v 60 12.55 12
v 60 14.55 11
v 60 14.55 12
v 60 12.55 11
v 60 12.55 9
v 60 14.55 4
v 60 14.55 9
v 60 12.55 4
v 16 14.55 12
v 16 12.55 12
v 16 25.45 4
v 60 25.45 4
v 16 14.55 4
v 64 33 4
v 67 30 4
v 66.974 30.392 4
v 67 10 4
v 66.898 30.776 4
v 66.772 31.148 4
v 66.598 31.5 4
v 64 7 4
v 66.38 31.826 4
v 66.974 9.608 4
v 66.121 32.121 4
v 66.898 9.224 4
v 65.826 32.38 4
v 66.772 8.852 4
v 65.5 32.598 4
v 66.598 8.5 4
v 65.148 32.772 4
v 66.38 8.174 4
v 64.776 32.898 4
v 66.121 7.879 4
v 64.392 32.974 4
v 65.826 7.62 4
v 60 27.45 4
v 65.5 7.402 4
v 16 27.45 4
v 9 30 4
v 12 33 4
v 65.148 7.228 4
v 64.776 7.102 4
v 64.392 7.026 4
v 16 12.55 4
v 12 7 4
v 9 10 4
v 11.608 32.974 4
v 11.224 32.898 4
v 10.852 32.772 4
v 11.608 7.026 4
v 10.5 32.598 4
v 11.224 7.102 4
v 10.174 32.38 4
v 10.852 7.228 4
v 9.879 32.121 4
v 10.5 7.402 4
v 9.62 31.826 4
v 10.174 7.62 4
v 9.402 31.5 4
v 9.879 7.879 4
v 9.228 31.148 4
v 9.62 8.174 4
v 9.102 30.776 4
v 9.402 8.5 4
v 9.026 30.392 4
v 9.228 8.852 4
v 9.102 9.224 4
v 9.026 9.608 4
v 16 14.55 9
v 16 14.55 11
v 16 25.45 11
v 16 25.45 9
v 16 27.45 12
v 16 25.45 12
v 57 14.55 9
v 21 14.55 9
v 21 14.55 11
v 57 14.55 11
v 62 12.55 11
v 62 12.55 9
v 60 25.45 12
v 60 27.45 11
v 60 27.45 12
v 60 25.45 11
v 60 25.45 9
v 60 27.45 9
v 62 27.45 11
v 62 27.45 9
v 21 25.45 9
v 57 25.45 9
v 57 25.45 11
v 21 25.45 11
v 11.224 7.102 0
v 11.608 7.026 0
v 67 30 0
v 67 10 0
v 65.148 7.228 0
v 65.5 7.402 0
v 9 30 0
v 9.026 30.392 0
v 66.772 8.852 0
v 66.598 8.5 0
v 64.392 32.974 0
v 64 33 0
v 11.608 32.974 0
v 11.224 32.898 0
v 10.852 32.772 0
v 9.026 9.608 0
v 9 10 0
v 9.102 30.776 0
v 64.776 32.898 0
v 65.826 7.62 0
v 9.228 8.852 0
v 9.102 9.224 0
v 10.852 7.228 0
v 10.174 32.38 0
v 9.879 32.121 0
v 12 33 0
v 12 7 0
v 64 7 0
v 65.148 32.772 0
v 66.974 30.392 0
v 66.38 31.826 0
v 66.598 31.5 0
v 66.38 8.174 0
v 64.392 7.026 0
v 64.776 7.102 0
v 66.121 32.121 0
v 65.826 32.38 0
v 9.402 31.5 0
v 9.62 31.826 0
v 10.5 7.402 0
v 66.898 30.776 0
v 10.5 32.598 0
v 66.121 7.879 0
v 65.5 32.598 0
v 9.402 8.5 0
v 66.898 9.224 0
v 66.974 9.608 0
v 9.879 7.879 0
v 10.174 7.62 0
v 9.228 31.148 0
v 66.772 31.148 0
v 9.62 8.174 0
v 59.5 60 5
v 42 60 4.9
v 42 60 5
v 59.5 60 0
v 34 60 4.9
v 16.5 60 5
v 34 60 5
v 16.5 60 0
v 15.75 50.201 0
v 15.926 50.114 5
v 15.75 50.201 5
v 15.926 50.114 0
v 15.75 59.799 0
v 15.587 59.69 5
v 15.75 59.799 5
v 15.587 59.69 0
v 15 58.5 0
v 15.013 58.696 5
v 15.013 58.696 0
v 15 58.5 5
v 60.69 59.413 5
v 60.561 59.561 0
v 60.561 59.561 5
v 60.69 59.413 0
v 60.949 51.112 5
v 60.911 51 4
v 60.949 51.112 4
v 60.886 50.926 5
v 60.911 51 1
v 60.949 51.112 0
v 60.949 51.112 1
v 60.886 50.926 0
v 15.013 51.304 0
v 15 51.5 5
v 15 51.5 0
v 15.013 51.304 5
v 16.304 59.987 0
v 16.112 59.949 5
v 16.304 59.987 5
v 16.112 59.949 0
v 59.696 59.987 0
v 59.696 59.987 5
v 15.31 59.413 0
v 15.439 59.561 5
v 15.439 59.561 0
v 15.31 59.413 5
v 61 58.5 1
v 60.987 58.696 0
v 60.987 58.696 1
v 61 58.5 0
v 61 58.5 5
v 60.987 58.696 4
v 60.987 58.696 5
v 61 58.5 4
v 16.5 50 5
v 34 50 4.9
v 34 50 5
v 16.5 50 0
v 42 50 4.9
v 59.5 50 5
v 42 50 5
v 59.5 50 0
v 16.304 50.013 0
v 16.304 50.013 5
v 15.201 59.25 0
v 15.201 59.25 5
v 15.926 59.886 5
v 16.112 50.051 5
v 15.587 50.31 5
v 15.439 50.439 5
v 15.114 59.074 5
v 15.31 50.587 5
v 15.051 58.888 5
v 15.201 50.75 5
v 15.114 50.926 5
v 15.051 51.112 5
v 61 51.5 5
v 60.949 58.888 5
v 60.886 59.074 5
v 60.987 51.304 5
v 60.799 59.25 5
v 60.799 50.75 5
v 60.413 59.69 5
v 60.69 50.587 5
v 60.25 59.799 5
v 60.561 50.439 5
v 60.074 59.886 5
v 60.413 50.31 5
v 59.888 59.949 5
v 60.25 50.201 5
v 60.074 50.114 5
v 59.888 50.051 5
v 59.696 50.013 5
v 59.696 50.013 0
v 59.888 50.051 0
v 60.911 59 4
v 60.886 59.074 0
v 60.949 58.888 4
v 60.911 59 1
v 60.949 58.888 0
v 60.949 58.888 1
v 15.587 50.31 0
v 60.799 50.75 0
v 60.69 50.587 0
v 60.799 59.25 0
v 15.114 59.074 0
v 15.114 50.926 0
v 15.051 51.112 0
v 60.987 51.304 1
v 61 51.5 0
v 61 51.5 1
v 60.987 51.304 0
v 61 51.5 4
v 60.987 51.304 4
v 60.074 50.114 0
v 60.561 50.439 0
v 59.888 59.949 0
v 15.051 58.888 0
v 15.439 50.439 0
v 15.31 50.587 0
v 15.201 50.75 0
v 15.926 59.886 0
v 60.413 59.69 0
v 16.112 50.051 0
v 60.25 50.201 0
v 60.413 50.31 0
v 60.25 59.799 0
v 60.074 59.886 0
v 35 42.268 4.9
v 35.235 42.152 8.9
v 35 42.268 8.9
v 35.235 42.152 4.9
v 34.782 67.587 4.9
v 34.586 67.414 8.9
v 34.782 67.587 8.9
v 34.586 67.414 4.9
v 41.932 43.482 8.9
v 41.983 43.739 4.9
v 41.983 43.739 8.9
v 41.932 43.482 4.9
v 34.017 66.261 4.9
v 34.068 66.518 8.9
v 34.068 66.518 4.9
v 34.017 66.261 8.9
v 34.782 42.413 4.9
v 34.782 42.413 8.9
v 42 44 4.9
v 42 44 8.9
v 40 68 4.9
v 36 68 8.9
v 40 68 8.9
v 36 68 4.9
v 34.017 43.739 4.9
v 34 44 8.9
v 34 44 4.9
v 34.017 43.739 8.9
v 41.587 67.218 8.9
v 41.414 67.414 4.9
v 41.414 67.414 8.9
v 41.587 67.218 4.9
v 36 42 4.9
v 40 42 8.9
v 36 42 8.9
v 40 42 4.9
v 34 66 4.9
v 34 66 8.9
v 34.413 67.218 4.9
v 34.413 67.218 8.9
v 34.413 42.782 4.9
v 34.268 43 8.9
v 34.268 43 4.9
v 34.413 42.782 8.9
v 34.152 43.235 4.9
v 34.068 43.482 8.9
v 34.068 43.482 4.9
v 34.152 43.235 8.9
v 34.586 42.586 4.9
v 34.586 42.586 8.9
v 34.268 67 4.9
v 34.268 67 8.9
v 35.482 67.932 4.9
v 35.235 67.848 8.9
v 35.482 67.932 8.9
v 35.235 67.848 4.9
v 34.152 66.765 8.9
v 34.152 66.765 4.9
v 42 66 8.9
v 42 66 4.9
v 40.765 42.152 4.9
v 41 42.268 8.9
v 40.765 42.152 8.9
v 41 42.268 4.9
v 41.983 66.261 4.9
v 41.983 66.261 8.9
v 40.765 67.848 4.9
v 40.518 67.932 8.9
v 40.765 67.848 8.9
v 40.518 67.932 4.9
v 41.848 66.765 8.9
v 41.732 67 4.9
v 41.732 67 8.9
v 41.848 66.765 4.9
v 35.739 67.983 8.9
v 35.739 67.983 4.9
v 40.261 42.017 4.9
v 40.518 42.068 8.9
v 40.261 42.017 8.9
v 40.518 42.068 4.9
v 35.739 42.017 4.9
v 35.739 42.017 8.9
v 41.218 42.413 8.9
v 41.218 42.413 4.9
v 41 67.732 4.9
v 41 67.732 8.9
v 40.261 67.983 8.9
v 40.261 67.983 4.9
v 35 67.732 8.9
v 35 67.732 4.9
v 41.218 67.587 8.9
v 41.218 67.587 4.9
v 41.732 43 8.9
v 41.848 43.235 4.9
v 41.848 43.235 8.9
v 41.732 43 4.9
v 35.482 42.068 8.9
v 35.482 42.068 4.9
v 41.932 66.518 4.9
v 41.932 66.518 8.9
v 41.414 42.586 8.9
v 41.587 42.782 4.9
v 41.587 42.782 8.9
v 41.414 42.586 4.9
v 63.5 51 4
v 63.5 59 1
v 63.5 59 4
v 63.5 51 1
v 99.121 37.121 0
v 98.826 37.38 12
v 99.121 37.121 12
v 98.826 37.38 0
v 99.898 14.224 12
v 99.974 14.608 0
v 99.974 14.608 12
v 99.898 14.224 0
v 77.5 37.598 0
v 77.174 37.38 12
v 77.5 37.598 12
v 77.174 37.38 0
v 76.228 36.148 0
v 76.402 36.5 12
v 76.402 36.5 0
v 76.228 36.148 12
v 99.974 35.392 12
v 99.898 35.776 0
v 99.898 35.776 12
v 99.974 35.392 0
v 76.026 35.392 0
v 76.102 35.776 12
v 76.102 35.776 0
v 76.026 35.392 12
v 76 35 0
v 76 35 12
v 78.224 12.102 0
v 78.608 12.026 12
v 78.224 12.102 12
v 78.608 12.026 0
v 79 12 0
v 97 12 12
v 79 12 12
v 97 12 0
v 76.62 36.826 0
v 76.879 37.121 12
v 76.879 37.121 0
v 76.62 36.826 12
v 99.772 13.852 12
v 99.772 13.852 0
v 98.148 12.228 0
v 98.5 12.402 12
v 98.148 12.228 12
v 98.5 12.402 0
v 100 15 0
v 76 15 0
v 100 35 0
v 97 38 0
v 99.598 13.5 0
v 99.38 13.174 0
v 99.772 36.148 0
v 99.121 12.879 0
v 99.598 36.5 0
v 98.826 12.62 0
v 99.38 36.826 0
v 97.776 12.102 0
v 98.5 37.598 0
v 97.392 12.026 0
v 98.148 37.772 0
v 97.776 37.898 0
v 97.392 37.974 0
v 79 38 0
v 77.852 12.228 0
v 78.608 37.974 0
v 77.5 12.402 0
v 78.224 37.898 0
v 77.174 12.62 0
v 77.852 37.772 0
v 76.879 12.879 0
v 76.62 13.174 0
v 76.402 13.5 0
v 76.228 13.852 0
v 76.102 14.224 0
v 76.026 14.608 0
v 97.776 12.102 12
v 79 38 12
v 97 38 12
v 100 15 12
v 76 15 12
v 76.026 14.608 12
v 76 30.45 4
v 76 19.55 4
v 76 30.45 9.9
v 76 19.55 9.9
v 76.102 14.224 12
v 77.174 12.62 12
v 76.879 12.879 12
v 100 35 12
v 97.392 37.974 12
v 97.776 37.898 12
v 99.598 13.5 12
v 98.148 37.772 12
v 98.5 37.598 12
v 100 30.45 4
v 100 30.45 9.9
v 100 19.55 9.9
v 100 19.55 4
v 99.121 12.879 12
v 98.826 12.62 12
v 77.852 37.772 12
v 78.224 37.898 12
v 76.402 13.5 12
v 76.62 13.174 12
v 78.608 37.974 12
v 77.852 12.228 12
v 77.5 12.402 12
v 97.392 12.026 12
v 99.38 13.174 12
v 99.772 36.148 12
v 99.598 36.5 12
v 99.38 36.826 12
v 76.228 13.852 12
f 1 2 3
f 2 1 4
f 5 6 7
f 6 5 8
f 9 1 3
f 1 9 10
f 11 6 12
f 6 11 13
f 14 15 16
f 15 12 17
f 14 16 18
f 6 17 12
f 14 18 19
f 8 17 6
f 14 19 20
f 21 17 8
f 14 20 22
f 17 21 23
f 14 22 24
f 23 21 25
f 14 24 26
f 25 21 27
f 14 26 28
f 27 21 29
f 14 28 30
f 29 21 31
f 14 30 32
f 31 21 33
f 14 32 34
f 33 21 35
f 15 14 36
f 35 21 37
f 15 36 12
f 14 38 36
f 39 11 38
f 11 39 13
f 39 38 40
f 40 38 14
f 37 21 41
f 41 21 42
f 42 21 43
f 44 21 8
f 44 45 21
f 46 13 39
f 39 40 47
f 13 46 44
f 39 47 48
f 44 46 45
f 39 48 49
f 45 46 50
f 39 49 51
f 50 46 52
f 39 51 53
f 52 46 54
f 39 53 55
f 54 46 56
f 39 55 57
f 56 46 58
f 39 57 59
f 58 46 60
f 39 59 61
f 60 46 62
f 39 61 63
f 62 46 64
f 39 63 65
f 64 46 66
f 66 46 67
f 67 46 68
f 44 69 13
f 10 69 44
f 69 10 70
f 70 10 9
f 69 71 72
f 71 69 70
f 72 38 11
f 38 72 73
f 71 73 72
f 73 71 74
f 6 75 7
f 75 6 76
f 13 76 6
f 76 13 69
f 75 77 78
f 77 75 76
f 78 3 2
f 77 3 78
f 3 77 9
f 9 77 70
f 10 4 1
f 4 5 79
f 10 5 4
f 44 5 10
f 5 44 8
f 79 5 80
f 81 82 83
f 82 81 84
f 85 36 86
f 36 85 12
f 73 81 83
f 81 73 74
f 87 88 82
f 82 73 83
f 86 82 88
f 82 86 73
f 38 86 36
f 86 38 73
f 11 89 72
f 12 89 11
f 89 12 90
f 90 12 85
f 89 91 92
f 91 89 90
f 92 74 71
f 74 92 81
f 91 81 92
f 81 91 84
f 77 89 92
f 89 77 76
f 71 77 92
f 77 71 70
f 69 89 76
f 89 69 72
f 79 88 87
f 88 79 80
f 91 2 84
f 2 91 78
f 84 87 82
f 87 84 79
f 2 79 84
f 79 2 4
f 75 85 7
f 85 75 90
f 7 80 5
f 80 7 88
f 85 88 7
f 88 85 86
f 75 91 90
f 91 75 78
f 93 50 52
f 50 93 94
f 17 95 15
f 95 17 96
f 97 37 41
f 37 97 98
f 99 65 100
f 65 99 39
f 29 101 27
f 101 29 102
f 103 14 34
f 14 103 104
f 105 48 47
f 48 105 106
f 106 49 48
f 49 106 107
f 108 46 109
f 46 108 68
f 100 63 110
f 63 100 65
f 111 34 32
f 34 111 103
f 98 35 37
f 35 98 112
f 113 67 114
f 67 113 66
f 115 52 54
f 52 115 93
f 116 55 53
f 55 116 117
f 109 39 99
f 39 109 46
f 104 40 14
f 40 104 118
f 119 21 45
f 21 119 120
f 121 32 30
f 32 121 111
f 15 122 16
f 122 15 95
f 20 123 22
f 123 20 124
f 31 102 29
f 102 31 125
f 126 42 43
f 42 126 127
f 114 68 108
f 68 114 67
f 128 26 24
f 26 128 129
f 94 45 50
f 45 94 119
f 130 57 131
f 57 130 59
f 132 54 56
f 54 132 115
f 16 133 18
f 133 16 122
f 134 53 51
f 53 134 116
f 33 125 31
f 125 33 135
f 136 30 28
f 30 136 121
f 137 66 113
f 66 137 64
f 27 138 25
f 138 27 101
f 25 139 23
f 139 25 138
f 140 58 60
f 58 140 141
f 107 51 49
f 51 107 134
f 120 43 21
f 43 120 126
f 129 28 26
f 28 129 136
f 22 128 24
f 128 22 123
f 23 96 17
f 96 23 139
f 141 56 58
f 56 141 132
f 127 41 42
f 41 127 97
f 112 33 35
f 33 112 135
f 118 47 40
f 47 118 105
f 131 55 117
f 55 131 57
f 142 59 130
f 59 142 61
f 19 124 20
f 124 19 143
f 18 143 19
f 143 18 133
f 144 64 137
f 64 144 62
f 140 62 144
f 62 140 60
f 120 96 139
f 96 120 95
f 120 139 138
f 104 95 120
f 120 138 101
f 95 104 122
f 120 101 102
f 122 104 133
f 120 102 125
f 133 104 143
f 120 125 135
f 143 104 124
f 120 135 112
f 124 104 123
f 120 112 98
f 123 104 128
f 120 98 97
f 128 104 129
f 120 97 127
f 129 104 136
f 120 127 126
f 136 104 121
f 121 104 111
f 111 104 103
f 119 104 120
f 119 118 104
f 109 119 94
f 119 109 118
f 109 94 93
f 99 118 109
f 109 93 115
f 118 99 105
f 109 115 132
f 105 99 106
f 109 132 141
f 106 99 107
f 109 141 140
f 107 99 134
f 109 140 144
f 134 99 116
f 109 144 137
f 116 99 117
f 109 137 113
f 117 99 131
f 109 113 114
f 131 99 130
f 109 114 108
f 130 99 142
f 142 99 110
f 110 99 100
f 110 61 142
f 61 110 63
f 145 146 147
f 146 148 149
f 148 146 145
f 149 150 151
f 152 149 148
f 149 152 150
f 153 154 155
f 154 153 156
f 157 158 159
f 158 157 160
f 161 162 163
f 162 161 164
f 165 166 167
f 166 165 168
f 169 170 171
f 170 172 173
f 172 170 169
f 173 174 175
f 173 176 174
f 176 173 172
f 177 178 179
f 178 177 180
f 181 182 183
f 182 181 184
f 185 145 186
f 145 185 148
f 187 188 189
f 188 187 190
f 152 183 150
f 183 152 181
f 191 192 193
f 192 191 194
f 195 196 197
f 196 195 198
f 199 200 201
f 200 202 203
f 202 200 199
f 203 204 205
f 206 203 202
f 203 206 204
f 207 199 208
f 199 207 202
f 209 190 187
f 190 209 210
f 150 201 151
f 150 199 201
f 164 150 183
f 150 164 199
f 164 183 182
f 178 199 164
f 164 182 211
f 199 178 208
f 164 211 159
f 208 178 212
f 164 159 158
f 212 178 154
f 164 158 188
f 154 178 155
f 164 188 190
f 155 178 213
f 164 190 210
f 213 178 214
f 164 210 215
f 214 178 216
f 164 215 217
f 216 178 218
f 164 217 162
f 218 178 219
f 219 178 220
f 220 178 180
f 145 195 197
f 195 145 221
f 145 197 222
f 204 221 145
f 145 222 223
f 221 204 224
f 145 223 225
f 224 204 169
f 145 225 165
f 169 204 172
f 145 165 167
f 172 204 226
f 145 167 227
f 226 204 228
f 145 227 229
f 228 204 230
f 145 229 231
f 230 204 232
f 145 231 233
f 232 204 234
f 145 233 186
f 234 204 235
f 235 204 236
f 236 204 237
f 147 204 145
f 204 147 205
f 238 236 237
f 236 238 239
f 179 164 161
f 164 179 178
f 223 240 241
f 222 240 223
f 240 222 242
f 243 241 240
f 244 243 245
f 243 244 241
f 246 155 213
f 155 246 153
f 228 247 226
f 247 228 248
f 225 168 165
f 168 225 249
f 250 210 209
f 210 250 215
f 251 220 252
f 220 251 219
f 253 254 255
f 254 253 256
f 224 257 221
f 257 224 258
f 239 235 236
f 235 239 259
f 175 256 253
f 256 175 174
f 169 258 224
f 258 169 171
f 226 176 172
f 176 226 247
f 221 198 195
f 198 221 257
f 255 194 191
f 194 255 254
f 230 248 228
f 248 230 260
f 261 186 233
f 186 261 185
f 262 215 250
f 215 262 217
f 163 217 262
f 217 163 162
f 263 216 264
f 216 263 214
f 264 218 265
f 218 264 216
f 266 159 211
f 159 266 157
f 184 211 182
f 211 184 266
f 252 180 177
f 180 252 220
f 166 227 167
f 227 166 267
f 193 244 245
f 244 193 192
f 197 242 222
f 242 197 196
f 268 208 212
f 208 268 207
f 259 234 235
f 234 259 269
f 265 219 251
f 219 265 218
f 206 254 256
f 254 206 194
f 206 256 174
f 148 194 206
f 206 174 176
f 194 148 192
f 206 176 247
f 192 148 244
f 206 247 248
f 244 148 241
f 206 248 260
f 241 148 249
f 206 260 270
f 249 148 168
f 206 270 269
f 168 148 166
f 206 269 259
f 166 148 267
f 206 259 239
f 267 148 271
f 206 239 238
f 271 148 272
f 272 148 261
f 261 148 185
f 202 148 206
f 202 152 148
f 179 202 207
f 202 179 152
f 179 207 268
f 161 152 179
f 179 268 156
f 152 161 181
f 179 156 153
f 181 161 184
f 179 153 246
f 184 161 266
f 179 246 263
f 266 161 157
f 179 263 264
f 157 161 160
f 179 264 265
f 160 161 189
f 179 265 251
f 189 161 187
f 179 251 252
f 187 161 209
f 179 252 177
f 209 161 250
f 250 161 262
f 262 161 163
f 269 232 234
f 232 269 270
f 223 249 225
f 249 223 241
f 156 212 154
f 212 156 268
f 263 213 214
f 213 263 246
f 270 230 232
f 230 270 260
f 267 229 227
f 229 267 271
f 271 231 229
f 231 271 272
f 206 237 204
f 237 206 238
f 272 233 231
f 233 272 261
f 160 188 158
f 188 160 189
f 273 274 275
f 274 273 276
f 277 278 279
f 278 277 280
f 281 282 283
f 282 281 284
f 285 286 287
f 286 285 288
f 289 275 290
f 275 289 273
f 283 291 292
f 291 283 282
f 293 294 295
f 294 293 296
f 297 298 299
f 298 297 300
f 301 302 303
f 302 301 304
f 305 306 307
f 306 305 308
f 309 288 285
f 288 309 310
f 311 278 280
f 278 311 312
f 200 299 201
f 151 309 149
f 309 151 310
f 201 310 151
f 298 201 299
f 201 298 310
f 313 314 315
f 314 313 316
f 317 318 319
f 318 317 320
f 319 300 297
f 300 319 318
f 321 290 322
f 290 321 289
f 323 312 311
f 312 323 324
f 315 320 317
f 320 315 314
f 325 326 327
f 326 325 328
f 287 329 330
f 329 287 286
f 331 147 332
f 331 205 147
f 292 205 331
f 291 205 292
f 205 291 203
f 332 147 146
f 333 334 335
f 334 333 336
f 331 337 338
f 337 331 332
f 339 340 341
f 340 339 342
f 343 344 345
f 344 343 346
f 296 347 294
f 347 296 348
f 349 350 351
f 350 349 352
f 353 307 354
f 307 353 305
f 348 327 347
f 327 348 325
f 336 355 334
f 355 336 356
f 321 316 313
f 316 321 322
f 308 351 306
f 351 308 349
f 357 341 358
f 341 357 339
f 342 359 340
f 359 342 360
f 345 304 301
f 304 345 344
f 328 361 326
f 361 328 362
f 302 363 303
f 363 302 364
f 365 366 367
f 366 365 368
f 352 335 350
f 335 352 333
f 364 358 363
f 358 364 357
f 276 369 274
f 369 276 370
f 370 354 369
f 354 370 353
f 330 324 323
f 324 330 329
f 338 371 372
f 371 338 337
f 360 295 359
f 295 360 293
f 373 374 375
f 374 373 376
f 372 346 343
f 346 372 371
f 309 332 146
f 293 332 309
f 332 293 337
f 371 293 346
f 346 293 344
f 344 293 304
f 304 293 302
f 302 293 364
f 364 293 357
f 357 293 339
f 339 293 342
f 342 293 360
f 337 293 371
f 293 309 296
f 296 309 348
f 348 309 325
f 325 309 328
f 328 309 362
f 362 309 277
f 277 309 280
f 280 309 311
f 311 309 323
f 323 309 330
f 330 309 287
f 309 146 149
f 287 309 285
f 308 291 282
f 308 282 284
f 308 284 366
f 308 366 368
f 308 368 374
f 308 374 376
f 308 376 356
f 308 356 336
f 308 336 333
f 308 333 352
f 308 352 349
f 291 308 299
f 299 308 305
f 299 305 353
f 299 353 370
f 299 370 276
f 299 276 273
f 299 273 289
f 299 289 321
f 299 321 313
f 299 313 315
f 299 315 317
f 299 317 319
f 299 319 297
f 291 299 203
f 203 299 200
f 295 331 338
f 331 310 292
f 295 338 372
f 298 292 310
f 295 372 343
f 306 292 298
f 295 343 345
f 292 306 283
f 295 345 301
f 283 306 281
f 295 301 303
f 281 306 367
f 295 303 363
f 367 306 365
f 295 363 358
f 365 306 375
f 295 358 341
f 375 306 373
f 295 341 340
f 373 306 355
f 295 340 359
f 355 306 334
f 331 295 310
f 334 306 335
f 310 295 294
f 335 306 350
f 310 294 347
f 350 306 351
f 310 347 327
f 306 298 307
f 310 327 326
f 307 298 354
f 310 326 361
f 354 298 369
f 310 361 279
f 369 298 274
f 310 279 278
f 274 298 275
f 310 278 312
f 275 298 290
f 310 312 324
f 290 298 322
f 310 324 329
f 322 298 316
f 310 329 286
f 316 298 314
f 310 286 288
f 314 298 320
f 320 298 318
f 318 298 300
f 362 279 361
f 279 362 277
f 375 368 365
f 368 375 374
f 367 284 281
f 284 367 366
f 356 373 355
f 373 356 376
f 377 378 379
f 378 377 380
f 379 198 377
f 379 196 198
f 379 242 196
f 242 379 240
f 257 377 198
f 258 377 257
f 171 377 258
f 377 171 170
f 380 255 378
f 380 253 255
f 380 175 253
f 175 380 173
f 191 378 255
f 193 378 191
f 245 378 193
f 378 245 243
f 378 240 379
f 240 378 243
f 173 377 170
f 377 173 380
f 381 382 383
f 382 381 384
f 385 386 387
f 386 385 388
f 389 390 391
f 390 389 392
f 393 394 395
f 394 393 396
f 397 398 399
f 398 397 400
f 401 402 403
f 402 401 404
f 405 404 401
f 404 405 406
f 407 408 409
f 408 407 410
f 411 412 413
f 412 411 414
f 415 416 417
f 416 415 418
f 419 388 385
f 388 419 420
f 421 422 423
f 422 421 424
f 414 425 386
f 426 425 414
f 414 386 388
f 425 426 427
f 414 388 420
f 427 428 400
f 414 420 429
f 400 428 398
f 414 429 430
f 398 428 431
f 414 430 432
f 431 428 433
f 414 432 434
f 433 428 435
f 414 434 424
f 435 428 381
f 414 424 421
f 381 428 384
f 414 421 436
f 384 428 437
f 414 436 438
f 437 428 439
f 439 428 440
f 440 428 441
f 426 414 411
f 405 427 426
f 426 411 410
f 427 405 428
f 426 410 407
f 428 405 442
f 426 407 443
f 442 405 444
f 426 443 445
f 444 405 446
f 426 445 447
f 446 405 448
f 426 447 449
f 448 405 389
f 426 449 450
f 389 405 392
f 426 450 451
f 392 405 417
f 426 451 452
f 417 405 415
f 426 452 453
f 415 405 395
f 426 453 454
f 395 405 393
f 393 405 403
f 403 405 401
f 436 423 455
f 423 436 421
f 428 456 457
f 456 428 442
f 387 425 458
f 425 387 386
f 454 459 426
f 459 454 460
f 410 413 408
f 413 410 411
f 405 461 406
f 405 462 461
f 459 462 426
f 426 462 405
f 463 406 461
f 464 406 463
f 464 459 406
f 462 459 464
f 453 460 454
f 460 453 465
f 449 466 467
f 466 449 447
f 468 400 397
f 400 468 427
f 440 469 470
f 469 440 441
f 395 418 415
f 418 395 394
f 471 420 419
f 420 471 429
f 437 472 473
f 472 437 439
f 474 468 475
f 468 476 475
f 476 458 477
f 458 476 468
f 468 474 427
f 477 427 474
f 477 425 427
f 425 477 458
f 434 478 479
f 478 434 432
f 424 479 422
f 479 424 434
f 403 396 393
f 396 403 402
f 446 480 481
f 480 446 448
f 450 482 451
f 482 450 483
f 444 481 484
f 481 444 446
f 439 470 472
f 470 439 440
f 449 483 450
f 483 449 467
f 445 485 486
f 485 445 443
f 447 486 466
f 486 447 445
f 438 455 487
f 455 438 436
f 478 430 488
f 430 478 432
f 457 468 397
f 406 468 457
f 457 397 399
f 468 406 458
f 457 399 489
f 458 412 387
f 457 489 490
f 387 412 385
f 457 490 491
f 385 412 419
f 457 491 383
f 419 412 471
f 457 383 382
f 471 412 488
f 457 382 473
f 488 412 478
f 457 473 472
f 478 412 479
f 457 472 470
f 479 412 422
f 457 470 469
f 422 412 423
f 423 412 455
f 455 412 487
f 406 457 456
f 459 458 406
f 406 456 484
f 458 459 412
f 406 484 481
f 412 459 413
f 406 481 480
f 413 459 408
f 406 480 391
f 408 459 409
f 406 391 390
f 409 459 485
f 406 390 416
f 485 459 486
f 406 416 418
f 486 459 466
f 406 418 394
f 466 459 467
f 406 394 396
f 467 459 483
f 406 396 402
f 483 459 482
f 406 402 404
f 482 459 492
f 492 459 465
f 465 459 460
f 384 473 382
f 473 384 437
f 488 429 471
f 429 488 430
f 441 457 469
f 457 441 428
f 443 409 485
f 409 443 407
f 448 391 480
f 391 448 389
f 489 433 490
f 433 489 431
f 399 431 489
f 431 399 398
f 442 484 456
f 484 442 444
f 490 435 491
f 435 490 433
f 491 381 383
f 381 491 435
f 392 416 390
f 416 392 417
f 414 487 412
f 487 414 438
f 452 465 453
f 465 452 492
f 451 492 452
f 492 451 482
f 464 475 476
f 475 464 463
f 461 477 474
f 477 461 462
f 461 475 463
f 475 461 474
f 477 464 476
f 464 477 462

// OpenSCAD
/*
Sample 084: Linearer Schubriegel — 0,45 mm
Generated from the FDM Mechanical Sample Library.
Units: millimetres.

Override examples:
  openscad -o custom.stl -D 'view="plate"' -D 'render_fn=64' model.scad
  openscad -o preview.png -D 'view="assembly"' model.scad
*/
use <../../../library/fdm_mechanisms.scad>

render_fn = is_undef(render_fn) ? 48 : render_fn;
view = is_undef(view) ? "plate" : view;
$fn = render_fn;

sample_slide_bolt(
    view=view,
    clearance=0.45,
    bolt_w=10,
    bolt_h=5
);
